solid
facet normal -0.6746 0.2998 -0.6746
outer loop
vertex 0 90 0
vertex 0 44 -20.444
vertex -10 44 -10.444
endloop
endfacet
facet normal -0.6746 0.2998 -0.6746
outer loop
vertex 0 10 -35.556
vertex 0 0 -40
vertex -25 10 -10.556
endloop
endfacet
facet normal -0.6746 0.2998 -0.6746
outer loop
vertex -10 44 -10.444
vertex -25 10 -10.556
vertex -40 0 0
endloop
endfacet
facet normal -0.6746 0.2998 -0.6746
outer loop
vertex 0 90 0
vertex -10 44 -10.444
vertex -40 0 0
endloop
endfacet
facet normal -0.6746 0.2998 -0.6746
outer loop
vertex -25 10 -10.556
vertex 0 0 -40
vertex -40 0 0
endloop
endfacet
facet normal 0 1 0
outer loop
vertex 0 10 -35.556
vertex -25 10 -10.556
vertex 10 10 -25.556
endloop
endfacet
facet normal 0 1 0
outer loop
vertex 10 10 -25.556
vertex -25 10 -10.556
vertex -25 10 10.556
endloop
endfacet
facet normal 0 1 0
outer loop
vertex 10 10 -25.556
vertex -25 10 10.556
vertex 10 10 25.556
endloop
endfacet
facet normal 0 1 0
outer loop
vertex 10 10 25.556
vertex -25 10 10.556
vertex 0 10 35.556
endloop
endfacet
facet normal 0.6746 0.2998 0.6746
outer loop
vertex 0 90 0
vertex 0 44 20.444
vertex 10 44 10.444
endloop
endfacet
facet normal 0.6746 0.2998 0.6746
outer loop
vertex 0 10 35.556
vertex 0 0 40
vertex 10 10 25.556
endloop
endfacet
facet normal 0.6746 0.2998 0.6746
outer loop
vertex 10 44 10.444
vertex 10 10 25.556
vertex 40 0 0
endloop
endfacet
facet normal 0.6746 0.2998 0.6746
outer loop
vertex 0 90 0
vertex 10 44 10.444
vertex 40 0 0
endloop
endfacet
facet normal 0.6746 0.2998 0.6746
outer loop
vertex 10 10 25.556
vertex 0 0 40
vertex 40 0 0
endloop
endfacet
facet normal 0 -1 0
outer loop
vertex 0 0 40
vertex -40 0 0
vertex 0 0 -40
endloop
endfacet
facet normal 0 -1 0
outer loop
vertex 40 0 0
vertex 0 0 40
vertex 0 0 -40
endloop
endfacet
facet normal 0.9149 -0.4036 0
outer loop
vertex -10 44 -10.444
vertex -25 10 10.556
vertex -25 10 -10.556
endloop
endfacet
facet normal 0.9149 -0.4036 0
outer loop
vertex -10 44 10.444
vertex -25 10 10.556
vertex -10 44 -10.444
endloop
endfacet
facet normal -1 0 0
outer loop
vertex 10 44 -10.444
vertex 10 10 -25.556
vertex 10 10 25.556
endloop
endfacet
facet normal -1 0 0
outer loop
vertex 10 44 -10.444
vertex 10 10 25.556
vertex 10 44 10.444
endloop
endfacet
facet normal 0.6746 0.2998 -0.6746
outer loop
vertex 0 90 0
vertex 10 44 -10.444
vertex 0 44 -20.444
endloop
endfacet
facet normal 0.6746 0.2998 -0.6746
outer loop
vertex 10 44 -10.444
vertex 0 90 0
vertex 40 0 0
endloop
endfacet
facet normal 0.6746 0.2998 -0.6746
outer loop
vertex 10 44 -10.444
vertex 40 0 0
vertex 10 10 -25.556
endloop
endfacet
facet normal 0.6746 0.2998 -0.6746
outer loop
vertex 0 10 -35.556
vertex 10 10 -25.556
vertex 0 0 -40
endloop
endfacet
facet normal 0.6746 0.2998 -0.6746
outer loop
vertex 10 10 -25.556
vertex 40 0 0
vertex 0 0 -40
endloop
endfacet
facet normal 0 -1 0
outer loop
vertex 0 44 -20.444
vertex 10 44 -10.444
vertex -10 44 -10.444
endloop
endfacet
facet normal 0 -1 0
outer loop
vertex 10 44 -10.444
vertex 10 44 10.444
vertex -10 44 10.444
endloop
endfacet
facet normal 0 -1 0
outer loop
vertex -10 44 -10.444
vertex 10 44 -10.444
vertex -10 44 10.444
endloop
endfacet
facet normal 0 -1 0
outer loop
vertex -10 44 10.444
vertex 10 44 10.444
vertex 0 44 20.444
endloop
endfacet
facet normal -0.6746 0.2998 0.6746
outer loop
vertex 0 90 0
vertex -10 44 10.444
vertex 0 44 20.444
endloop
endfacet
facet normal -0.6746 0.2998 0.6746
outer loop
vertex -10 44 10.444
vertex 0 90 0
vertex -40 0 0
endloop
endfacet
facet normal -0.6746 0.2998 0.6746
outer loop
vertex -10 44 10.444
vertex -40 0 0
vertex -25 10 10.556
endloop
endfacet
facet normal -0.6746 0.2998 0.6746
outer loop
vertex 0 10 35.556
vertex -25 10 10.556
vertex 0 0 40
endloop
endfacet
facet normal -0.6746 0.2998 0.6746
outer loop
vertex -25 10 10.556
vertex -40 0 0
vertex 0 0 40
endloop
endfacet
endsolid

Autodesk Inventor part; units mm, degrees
ref_plane "YZ Plane" through (0, 0, 0) normal (1, 0, 0) x (0, 1, 0)
ref_plane "XY Plane" through (0, 0, 0) normal (0, 0, 1) x (1, 0, 0)
sketch "Эскиз1" plane through (0, 0, 0) normal (0, 1, 0) x (-1, 0, 0)
  circle A0 centre (0, 0) radius 40
  line L0 (40, 0) -> (0, -40)
  line L1 (0, -40) -> (-40, 0)
  line L2 (-40, 0) -> (0, 40)
  line L3 (0, 40) -> (40, 0)
  dimension "d0" = 80
ref_plane "РабПлоскость1" through (0, 90, 0) normal (0, 1, 0) x (-1, 0, 0)
sketch "Эскиз2" plane through (0, 90, 0) normal (0, 1, 0) x (-1, 0, 0)
  point P0 (0, 0)
  point P1 (0, 0)
loft "Лофт1" add profiles "Эскиз1" section 1 point at (0, 90, 0) contours L0 L1 L2 L3
sketch "Эскиз3" plane through (0, 0, 0) normal (0, 0, 1) x (1, 0, 0)
  line L0 (0, 0) -> (0, 10)
  line L1 (0, 90) -> (0, 0) projected
  line L2 (0, 10) -> (10, 10)
  line L3 (10, 10) -> (10, 44)
  line L4 (10, 44) -> (-10, 44)
  line L5 (0, 10) -> (-25, 10)
  line L6 (-25, 10) -> (-10, 44)
extrude "Выдавливание1" cut sketch "Эскиз3" against normal mid plane 90
